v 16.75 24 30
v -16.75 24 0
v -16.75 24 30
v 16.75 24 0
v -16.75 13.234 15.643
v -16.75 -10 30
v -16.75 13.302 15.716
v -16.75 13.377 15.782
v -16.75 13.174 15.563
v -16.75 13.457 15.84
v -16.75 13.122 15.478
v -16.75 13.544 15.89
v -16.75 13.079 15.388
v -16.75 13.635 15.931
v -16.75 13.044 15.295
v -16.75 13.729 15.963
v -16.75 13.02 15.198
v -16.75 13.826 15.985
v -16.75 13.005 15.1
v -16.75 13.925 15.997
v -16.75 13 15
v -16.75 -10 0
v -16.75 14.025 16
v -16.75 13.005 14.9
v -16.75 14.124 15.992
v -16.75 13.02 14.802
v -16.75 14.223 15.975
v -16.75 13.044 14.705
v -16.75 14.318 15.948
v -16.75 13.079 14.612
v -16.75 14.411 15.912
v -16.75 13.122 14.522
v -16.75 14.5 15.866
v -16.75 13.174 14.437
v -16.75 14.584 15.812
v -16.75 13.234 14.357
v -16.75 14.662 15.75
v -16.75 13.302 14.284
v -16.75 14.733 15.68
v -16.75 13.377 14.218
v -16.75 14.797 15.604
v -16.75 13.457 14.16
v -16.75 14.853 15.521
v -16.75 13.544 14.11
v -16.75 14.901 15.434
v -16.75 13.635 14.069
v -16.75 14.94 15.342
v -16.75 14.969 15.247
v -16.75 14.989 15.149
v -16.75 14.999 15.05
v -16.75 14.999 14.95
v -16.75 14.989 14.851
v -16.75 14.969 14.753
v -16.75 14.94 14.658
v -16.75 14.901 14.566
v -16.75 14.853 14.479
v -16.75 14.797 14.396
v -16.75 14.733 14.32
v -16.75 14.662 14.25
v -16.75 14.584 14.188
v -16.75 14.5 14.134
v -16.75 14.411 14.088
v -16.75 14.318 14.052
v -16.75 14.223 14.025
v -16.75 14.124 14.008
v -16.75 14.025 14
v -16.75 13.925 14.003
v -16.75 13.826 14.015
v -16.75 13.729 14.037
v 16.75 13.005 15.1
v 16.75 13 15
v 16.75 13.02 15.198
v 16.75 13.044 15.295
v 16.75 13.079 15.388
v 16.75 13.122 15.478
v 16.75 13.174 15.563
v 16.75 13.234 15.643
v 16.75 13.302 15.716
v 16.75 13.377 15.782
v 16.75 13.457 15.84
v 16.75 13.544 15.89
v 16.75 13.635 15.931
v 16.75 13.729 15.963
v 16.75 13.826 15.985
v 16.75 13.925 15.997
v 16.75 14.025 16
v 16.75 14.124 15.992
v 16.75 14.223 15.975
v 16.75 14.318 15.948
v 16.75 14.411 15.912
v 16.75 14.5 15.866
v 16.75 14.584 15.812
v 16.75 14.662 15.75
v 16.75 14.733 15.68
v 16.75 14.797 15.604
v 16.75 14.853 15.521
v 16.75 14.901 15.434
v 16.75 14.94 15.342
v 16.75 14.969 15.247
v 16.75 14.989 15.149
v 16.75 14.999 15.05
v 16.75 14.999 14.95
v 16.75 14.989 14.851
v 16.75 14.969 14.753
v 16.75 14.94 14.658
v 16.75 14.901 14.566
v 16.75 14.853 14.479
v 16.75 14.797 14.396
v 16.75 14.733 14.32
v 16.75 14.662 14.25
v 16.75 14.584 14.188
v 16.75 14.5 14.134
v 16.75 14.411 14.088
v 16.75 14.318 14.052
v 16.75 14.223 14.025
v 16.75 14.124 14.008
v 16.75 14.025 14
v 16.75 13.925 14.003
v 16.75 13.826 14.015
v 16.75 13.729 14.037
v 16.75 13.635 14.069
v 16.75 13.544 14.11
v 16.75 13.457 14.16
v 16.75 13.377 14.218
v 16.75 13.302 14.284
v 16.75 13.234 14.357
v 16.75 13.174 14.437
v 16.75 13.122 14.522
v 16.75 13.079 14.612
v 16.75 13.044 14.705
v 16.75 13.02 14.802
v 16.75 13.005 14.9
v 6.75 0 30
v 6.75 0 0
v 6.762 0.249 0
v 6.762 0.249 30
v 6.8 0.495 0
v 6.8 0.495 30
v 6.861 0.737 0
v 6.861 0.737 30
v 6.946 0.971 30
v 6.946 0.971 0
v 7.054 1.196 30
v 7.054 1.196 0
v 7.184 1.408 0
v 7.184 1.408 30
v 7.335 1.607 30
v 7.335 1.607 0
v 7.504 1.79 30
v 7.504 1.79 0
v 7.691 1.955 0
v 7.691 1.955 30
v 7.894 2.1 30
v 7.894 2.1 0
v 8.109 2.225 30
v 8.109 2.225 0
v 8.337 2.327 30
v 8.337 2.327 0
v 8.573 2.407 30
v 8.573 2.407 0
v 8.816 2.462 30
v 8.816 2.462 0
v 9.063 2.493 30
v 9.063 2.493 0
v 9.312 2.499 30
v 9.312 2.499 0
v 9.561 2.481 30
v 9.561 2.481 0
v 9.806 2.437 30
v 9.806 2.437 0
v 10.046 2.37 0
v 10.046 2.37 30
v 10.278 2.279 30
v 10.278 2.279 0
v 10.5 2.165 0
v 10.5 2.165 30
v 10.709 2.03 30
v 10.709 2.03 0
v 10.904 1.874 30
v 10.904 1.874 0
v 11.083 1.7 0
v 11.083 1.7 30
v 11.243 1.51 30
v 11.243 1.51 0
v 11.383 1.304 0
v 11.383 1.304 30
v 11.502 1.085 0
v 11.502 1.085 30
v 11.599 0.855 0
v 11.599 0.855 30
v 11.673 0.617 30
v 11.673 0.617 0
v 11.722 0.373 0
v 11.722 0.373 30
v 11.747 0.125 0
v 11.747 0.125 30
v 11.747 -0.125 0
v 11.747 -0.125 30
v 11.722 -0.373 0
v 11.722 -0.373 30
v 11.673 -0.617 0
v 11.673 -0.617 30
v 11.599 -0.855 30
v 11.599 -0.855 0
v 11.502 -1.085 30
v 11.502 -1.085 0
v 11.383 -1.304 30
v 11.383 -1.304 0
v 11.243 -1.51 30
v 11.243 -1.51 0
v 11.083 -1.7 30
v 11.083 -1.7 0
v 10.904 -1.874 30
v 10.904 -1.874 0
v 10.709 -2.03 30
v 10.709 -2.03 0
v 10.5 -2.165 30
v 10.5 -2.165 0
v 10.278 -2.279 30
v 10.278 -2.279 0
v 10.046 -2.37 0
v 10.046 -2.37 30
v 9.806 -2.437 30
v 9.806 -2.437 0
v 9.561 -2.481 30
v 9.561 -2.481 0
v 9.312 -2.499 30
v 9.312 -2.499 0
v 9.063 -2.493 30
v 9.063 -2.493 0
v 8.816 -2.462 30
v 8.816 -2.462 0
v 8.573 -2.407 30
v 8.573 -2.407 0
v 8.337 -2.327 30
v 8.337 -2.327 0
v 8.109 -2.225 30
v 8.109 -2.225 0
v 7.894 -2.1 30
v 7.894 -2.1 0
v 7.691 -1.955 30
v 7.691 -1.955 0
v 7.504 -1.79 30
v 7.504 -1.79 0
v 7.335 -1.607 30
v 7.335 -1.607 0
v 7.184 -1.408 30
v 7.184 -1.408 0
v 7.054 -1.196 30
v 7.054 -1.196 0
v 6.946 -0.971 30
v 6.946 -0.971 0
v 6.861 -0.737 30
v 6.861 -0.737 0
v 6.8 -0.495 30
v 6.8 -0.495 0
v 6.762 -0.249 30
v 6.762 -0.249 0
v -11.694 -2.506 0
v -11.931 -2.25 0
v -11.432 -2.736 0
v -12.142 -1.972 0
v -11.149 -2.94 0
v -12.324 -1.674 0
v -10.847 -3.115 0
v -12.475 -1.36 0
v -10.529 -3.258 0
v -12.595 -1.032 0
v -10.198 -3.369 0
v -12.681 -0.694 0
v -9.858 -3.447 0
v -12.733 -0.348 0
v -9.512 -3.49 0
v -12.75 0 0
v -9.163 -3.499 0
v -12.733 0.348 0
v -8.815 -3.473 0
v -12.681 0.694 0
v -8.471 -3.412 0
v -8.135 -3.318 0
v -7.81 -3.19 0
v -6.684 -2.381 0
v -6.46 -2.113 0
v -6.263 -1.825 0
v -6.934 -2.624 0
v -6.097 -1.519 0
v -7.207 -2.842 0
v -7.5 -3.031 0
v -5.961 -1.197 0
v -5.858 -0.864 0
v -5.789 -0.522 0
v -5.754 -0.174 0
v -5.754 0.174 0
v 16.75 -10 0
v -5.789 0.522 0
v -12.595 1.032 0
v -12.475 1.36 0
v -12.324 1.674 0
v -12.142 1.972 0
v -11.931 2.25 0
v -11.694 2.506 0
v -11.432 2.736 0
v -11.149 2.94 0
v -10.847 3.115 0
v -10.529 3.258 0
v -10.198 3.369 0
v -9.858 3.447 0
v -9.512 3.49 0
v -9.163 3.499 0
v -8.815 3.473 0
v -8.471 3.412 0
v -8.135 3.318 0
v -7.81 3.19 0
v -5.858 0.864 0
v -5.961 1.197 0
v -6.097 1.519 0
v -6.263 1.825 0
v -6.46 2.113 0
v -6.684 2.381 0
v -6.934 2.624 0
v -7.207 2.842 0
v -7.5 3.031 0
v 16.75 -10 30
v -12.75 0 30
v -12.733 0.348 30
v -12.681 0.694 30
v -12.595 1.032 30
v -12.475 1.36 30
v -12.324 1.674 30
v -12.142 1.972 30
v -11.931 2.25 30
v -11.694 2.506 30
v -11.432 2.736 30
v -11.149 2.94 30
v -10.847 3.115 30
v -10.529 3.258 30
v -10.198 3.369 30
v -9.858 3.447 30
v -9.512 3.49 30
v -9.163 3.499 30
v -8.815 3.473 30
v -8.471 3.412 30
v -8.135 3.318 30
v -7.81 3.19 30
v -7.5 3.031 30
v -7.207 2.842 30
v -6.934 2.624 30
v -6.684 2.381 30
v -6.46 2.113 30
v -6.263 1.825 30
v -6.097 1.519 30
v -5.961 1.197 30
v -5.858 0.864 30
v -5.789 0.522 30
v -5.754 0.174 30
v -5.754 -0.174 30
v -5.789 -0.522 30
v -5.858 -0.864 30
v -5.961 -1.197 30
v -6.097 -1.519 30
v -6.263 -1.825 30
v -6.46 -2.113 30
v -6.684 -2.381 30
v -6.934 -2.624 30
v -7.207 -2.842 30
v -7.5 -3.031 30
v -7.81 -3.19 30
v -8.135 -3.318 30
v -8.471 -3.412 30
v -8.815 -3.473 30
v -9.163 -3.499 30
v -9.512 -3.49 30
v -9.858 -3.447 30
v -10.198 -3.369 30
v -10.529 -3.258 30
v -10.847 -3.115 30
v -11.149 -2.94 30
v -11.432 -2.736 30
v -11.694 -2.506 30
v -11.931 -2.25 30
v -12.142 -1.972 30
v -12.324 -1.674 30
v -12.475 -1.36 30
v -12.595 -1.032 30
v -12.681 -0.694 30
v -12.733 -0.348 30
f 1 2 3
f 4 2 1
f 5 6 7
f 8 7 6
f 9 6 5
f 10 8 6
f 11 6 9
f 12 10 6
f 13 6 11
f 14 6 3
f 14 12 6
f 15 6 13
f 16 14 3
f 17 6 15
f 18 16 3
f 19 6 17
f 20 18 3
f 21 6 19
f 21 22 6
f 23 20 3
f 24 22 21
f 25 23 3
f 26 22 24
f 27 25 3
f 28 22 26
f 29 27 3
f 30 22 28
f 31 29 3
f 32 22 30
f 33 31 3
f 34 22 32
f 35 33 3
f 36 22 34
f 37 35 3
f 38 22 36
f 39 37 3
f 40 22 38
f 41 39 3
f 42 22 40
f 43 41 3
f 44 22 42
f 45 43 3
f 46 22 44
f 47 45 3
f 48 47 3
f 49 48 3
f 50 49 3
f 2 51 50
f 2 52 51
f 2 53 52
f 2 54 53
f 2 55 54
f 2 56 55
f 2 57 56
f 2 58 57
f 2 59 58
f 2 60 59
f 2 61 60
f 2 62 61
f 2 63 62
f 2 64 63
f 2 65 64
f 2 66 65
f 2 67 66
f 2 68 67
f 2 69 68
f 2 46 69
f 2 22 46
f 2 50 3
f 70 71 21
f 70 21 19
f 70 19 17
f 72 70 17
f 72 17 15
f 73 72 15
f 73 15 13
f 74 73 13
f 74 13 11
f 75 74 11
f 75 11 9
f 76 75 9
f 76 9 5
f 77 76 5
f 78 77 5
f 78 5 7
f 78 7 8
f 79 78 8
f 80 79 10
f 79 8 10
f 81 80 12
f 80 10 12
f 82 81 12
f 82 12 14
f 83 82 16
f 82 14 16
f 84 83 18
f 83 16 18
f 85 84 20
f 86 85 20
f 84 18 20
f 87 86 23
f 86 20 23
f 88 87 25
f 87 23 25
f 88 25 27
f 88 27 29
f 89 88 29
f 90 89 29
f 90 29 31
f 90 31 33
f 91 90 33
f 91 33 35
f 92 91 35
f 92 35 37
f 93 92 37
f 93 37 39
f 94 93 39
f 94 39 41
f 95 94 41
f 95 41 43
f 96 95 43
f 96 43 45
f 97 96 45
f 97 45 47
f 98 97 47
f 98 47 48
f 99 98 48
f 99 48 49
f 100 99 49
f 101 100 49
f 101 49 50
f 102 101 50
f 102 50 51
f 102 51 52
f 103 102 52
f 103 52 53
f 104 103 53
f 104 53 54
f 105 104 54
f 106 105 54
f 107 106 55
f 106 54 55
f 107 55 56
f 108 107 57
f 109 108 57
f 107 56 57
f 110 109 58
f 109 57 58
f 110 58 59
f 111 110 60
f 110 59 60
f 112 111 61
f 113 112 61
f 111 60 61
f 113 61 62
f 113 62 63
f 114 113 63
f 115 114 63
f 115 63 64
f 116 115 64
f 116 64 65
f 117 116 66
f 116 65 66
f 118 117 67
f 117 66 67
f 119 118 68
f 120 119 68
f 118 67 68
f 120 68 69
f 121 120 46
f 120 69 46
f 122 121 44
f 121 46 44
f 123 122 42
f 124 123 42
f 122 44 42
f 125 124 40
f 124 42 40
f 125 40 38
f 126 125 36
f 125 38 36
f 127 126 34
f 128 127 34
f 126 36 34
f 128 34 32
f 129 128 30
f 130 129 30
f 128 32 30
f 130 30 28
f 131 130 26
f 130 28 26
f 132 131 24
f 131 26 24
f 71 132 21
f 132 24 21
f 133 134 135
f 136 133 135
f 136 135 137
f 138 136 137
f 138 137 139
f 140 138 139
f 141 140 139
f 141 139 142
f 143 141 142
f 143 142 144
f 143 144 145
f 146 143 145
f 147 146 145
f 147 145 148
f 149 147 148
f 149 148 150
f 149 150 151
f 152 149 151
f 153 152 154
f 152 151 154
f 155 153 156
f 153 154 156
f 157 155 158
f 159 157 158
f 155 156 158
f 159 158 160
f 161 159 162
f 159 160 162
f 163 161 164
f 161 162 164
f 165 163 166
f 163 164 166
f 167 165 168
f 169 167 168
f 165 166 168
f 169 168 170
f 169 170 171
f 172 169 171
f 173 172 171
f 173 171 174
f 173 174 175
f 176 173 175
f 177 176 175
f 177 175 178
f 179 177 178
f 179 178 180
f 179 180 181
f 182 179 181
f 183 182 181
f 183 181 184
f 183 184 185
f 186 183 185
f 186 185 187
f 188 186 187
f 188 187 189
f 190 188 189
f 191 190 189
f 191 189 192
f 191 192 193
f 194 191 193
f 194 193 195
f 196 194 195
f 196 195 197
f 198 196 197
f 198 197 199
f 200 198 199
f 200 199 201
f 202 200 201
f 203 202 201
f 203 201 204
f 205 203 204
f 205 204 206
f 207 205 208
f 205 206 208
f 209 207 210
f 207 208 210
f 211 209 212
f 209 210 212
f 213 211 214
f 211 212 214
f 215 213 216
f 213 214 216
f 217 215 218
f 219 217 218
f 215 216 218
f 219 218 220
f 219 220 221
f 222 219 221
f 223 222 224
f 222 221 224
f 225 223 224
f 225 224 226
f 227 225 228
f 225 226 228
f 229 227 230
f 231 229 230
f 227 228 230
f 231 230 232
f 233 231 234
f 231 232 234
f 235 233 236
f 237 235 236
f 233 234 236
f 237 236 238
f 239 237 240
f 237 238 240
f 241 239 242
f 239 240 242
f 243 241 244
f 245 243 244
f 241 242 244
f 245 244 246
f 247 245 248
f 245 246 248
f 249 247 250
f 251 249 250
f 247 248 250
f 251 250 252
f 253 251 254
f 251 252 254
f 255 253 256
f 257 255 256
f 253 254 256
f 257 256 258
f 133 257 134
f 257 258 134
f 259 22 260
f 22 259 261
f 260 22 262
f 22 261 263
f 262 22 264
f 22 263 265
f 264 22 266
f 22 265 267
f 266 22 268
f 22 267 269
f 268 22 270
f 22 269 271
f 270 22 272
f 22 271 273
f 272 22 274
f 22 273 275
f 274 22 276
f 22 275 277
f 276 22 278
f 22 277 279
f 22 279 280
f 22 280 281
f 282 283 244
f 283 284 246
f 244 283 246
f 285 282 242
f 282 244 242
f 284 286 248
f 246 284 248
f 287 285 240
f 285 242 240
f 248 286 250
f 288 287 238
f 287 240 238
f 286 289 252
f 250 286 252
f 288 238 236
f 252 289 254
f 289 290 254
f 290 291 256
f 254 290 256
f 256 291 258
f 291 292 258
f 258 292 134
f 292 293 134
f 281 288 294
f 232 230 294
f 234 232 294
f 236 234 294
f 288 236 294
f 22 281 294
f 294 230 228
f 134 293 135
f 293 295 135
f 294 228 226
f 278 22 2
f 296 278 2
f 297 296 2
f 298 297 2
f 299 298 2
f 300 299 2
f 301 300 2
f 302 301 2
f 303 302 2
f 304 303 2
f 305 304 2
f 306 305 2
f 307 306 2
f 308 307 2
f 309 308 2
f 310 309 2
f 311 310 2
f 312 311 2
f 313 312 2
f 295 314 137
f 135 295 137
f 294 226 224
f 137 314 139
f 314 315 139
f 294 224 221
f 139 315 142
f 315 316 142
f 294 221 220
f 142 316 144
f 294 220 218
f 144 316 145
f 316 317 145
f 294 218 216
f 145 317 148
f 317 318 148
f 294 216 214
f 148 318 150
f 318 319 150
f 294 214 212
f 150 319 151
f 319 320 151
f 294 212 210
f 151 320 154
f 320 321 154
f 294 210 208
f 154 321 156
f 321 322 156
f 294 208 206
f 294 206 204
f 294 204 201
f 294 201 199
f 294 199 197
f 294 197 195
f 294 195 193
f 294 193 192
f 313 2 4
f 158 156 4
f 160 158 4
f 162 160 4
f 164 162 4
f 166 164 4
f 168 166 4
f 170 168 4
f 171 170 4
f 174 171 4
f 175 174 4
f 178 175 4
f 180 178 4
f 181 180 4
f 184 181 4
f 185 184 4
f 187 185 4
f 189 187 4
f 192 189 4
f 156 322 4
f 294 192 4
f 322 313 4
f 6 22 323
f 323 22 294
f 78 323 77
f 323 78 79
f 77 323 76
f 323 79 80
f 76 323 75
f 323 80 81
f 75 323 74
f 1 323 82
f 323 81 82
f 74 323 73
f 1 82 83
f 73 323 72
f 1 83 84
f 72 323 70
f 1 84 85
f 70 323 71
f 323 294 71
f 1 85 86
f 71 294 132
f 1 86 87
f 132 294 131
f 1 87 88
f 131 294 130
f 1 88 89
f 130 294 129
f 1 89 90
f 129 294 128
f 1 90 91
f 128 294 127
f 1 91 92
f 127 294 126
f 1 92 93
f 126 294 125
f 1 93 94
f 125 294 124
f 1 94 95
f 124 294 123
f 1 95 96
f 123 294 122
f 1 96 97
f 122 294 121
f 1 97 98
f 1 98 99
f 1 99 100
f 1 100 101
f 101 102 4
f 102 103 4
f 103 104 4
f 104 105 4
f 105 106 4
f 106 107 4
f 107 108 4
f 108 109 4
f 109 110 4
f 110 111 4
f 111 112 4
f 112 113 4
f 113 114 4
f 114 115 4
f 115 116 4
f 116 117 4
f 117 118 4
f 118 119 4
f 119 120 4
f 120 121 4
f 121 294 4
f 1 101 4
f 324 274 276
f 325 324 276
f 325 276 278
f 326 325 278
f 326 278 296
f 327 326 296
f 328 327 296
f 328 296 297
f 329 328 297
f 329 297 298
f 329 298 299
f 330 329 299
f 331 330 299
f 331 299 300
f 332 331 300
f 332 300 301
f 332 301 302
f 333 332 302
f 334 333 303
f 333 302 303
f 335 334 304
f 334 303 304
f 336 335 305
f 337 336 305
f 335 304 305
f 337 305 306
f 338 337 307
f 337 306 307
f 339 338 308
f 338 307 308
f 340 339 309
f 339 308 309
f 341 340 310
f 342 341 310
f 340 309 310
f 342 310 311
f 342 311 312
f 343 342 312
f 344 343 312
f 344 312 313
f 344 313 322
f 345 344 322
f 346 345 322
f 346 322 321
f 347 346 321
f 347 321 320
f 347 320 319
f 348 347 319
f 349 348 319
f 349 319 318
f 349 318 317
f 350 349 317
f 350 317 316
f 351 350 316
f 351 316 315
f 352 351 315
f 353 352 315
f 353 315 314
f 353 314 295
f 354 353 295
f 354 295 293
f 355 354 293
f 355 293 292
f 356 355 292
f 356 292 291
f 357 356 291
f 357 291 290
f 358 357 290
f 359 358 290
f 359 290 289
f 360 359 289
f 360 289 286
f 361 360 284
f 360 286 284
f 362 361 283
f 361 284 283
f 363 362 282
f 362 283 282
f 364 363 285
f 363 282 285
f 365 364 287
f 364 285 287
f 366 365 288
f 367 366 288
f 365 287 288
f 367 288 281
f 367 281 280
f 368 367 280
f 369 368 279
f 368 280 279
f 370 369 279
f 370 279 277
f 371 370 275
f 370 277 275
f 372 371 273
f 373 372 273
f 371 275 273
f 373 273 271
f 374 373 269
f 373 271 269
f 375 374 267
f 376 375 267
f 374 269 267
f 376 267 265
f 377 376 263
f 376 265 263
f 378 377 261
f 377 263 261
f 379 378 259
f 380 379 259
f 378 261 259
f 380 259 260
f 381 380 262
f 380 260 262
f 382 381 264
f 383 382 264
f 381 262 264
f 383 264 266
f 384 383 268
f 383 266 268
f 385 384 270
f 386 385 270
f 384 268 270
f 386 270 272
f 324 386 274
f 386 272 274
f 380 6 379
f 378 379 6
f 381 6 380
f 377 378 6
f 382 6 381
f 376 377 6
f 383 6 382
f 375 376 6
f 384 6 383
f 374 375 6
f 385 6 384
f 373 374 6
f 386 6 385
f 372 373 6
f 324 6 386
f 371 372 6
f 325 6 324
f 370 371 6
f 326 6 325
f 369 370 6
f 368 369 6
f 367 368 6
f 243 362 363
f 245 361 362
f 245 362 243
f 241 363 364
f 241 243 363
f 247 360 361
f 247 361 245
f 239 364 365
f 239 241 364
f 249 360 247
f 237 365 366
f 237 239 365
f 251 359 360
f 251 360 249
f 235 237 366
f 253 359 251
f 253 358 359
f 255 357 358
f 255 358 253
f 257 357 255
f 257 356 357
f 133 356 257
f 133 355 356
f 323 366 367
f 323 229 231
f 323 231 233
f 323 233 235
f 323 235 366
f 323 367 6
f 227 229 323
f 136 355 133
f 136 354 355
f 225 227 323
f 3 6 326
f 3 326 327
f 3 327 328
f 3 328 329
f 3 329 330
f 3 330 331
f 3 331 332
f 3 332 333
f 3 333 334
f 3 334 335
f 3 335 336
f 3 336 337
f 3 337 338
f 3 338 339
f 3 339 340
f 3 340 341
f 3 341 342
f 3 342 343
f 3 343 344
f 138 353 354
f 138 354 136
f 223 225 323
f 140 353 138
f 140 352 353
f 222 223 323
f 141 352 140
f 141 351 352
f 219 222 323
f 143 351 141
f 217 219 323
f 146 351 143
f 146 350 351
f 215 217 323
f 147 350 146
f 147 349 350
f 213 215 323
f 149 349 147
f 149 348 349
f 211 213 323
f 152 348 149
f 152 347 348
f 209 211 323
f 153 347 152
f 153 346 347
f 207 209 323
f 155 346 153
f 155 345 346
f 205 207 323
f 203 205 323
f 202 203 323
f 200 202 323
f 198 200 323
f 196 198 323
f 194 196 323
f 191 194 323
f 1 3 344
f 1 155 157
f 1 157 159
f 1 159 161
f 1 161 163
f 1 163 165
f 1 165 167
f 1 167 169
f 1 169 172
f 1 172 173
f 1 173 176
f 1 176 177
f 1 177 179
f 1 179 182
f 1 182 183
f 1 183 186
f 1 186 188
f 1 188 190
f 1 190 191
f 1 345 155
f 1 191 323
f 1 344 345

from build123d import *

# Parameters (mm, degrees)
F0_W     = 33.5
F0_H     = 20
F1_DEPTH = 30
F3_D     = 5
F4_D     = 7
F5_W     = 33.5
F5_H     = 14
F6_DEPTH = 30
F8_D     = 2


with BuildPart() as f1:
    # F0 (on Top) → F1 (new body)
    with BuildSketch(Plane.XY):
        Rectangle(F0_W, F0_H)
    extrude(amount=F1_DEPTH)

    # F3 (through all)
    with Locations(Plane.XY.offset(30)):
        with Locations((9.25, 0)):
            Hole(F3_D / 2)

    # F4 (through all)
    with Locations(Plane.XY.offset(30)):
        with Locations((-9.25, 0)):
            Hole(F4_D / 2)

    # F5 (on Top) → F6 (join)
    with BuildSketch(Plane.XY):
        with Locations((0, 17)):
            Rectangle(F5_W, F5_H)
    extrude(amount=F6_DEPTH)

    # F8 (through all)
    with Locations(Plane.YZ.offset(16.75)):
        with Locations((14, 15)):
            Hole(F8_D / 2)


solid = f1.part
